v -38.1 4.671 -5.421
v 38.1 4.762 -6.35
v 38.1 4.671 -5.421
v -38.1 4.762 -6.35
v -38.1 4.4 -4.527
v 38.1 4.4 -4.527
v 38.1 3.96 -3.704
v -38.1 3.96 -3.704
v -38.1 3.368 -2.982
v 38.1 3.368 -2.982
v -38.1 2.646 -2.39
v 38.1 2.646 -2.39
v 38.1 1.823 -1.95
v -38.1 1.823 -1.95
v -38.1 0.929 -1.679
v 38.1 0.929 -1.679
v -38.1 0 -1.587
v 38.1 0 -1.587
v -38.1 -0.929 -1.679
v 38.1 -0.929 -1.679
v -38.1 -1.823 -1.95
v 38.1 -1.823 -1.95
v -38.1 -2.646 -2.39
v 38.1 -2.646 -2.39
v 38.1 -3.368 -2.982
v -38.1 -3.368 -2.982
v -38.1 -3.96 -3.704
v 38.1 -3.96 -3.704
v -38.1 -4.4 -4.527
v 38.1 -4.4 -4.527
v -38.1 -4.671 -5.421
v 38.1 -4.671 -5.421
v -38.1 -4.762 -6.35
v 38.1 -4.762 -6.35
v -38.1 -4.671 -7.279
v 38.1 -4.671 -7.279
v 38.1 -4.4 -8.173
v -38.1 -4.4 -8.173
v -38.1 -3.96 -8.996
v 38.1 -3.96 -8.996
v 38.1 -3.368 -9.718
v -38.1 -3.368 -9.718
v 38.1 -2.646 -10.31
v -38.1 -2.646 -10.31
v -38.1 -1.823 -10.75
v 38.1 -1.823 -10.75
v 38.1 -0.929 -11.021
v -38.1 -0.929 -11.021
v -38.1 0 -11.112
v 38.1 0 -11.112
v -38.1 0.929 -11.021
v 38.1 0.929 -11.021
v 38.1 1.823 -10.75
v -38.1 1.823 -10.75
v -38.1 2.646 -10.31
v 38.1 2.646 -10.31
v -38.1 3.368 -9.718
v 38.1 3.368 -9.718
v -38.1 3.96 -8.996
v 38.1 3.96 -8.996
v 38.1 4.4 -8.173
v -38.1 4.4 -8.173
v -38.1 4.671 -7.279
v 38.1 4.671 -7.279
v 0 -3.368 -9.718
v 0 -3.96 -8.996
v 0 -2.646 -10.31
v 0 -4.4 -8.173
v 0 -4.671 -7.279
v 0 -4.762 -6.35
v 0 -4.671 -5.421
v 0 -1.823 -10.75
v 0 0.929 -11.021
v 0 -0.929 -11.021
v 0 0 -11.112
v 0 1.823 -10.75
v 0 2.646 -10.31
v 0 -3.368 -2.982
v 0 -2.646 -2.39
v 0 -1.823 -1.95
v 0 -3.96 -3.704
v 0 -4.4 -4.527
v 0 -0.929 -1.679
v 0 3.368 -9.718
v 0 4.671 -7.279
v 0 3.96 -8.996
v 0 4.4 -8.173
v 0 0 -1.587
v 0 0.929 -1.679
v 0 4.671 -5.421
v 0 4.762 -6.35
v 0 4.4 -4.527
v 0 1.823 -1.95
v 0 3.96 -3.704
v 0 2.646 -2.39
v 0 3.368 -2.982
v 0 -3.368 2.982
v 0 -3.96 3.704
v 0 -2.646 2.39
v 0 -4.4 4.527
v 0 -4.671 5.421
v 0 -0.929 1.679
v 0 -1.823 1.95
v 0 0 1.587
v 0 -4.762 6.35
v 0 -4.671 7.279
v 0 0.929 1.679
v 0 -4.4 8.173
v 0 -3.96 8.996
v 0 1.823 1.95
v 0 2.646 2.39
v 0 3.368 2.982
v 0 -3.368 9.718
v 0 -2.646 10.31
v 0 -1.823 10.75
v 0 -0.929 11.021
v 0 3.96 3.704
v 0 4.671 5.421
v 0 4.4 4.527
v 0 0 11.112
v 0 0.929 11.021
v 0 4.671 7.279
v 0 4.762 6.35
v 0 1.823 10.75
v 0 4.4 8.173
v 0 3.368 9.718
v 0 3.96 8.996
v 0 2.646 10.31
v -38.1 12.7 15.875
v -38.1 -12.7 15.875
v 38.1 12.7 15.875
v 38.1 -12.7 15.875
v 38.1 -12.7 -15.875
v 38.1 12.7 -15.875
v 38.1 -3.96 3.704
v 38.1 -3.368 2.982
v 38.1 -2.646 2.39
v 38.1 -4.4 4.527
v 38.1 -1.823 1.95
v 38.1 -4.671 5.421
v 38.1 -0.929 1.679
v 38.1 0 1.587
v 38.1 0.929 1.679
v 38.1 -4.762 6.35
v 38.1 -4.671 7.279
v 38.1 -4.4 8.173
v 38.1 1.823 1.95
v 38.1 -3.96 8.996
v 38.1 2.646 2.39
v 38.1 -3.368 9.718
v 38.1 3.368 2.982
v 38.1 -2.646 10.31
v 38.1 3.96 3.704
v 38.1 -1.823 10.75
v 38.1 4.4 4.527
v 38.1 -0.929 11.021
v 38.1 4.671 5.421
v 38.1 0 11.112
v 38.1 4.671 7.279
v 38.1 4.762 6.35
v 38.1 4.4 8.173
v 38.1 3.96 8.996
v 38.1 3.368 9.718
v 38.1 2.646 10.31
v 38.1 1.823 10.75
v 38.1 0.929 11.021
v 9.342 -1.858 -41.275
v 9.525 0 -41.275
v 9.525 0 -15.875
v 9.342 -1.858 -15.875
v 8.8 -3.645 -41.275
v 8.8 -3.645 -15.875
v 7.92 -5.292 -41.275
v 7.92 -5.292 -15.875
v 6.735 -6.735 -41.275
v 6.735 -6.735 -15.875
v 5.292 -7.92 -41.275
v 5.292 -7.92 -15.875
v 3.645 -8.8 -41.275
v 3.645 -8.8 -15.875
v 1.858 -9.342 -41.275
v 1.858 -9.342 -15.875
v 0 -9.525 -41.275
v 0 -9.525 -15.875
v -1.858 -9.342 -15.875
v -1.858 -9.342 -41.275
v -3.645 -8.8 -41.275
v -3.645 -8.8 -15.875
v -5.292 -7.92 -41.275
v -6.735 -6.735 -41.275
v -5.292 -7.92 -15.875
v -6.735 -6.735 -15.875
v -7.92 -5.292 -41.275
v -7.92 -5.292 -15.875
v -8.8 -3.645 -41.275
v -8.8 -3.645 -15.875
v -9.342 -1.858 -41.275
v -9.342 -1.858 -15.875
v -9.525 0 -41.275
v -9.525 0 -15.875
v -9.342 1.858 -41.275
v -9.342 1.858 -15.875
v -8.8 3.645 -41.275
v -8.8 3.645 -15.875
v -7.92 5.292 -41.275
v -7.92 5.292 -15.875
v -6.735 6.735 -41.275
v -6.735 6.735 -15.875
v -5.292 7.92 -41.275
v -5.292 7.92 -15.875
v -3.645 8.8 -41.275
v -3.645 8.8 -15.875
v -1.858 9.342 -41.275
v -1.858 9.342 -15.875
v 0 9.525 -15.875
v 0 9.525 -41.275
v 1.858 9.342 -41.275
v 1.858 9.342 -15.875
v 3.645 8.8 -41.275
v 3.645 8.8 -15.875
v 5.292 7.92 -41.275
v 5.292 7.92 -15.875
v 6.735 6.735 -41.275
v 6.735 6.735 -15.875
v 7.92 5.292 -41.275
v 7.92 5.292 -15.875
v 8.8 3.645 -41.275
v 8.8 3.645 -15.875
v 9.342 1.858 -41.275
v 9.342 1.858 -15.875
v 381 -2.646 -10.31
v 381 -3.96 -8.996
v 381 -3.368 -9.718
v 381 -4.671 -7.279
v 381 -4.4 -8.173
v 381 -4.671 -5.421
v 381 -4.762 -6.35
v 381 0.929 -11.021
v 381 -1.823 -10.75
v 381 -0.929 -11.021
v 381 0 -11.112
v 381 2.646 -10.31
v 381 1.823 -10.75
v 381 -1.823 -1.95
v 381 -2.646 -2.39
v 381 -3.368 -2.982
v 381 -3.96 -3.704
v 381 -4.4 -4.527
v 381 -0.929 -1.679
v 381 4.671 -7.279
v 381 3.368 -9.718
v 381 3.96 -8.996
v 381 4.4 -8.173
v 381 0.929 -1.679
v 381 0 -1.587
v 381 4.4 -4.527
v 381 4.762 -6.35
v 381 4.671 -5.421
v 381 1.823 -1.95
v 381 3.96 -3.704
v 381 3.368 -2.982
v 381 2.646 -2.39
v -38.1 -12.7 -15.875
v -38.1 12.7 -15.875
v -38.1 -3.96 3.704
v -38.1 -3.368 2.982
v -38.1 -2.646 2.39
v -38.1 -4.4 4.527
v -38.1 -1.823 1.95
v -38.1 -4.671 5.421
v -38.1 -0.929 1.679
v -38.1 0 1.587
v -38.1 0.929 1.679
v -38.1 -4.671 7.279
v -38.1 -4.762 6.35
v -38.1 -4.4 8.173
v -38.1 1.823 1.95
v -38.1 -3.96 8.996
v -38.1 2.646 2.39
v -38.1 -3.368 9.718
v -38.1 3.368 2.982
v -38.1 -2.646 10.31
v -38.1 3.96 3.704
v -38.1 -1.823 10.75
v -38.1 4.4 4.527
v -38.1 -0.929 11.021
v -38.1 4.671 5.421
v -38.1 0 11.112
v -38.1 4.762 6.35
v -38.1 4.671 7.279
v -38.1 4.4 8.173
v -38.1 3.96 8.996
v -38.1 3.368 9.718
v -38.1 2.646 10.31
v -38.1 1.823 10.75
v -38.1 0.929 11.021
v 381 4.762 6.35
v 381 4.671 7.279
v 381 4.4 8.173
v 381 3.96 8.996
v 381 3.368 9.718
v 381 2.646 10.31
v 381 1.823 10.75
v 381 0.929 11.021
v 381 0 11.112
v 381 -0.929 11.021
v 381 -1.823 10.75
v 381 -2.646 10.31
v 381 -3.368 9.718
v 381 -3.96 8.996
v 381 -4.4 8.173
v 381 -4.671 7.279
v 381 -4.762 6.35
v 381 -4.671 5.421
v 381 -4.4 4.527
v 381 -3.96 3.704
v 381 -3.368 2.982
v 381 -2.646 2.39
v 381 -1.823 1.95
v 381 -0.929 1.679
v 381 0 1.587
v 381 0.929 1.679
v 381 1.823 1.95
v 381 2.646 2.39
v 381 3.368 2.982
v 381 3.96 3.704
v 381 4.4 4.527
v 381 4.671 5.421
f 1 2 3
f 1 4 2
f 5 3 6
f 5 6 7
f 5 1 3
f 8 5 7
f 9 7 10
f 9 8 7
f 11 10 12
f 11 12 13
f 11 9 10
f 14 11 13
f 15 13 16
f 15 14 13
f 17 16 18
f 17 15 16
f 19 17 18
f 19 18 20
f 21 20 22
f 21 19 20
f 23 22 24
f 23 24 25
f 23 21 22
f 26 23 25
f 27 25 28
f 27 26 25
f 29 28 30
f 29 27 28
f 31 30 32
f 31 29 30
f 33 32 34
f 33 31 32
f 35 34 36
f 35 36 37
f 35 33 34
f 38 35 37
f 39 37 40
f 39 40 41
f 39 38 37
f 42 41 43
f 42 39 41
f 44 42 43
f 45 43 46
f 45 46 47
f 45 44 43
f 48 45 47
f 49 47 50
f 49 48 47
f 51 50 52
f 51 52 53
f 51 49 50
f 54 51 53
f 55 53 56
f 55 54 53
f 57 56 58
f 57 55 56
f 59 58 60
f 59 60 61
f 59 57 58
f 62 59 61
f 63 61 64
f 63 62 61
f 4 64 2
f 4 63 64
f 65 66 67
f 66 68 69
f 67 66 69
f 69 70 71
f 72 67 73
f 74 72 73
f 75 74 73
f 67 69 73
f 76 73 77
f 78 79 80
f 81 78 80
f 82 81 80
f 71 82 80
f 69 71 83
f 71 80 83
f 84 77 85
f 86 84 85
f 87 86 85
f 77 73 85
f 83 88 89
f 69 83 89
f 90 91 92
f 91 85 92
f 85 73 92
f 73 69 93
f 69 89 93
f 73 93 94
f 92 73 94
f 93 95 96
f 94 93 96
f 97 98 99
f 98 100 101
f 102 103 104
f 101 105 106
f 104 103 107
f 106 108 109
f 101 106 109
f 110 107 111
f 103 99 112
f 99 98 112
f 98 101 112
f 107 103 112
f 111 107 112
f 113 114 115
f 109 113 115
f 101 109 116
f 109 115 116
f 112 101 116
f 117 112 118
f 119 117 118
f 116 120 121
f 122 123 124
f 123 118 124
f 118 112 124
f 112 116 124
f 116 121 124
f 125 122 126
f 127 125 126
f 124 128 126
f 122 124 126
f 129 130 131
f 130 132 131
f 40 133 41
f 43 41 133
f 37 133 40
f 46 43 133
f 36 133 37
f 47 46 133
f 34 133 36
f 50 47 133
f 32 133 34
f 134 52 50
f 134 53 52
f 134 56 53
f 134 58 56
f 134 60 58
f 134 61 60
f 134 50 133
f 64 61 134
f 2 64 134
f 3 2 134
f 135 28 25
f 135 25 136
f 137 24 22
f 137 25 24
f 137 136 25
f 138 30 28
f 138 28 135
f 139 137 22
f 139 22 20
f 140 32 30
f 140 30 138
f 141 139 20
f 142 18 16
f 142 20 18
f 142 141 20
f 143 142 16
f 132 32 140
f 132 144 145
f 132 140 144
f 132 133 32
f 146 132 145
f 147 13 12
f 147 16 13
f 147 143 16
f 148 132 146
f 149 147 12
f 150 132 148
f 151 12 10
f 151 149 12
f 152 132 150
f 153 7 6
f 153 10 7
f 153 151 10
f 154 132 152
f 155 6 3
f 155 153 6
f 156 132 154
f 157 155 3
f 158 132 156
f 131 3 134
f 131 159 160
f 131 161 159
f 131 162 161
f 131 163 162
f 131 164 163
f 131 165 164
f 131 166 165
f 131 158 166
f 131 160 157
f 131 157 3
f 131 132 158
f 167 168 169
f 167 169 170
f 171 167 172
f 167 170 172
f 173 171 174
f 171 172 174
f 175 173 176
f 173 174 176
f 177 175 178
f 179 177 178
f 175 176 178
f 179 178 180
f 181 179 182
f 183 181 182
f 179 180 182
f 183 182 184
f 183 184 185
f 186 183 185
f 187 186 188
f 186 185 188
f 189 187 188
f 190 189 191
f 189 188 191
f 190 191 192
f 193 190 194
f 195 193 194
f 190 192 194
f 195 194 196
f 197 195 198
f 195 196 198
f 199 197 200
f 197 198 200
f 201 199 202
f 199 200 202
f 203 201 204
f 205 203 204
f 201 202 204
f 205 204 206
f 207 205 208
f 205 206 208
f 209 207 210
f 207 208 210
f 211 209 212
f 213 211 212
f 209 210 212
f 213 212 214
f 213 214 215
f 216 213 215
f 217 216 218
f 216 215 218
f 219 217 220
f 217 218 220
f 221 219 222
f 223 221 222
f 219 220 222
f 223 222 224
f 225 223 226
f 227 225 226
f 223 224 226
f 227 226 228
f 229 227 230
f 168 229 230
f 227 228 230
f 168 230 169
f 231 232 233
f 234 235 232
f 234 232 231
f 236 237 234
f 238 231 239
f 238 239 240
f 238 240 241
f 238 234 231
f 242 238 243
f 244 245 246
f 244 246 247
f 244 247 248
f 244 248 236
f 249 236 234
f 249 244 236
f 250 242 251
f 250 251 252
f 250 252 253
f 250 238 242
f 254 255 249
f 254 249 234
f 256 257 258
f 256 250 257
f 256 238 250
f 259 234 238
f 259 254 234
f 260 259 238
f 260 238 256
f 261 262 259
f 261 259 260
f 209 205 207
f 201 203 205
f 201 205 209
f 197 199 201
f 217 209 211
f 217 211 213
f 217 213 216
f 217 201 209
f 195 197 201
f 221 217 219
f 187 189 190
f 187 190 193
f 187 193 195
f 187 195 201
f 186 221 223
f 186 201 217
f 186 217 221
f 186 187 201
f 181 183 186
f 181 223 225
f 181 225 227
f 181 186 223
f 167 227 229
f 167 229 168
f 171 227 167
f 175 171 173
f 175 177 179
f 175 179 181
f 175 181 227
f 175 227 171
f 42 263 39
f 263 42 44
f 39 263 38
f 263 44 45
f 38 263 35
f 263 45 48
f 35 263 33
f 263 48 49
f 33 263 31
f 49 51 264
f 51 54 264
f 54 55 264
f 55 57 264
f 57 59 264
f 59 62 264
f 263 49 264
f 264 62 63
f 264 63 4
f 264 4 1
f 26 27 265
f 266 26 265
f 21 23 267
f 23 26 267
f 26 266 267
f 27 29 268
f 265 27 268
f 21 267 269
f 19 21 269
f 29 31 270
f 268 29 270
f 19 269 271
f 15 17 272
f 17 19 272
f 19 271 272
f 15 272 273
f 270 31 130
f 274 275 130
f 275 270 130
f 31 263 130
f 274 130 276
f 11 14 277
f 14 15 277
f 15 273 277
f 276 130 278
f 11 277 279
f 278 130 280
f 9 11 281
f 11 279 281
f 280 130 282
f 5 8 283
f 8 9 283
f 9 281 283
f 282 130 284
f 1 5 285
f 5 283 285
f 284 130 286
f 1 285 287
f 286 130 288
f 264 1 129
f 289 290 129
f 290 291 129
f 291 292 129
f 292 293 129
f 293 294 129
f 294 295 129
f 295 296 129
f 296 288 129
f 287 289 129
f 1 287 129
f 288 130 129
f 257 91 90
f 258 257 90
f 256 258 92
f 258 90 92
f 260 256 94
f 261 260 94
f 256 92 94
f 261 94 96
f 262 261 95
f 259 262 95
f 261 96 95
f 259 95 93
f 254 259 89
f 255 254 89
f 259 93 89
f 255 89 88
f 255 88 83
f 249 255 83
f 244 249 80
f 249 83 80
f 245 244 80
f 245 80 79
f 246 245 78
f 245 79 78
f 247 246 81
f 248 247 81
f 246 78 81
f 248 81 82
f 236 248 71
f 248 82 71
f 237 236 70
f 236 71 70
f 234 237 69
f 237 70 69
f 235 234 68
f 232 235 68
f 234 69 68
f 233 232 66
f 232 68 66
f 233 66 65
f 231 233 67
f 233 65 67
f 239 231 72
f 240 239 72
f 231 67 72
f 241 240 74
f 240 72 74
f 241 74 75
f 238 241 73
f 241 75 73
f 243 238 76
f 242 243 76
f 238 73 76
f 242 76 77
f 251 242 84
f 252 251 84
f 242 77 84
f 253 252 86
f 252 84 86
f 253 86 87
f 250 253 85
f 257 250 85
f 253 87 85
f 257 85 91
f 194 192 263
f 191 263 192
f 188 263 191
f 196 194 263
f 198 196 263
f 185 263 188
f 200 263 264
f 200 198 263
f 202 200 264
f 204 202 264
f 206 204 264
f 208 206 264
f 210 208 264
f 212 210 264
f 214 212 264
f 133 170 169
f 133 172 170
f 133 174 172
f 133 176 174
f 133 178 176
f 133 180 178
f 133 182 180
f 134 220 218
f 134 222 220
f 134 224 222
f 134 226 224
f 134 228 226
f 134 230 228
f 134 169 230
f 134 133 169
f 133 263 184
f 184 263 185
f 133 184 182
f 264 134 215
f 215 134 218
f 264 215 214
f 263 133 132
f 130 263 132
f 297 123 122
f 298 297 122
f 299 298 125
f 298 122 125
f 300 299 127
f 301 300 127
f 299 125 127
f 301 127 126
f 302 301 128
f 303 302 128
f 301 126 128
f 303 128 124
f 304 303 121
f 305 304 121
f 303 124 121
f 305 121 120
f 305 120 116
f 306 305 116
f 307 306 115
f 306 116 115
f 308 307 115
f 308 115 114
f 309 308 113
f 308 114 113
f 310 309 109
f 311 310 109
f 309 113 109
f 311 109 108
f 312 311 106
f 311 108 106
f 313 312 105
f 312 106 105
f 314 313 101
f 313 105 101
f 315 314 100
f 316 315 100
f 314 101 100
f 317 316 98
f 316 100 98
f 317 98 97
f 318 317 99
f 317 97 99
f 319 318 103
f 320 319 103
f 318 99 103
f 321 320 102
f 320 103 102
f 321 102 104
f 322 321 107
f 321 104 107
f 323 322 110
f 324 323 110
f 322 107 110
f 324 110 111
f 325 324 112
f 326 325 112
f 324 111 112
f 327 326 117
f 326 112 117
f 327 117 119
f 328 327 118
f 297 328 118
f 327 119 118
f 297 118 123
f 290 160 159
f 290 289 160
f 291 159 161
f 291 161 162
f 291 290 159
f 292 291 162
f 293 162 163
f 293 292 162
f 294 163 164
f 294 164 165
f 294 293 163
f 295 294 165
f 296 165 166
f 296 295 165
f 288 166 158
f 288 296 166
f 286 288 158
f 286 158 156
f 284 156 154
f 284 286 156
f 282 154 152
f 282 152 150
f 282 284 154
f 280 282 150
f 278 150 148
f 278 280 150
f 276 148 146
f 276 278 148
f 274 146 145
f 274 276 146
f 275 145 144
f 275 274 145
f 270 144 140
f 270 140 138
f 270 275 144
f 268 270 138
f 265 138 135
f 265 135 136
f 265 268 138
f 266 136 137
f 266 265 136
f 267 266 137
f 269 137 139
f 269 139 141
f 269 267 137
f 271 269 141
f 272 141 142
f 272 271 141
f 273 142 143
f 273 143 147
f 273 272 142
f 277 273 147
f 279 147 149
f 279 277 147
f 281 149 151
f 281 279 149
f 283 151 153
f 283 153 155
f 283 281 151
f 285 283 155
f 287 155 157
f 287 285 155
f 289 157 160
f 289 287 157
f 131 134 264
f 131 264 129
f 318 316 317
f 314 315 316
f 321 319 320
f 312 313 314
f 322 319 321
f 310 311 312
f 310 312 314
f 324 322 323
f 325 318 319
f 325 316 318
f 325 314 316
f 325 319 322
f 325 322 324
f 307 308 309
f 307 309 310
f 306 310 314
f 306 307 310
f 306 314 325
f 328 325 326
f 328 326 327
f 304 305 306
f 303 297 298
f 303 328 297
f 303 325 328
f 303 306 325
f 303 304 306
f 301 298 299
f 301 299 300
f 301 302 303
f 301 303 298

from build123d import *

# Parameters (mm, degrees)
F0_W     = 25.4
F0_H     = 31.75
F0_R     = 4.7625
F1_DEPTH = 38.1
F2_DEPTH = 381
F3_R     = 9.525
F4_DEPTH = 25.4


with BuildPart() as f1:
    # F0 (on Right) → F1 (new body, symmetric)
    with BuildSketch(Plane.YZ):
        Rectangle(F0_W, F0_H)
        with Locations((0, -6.35)):
            Circle(F0_R, mode=Mode.SUBTRACT)
        with Locations((0, 6.35)):
            Circle(F0_R, mode=Mode.SUBTRACT)
    extrude(amount=F1_DEPTH, both=True)

    # F3 (on face) → F4 (join)
    with BuildSketch(Plane(origin=(0, 0, -15.875), x_dir=(1, 0, 0), z_dir=(0, 0, -1))):
        Circle(F3_R)
    extrude(amount=F4_DEPTH)


with BuildPart() as f2:
    # F0 (on Right) → F2 (new body)
    with BuildSketch(Plane.YZ):
        with Locations((0, 6.35)):
            Circle(F0_R)
    extrude(amount=F2_DEPTH)


with BuildPart() as f2b:
    # F0 (on Right) → F2, piece 2 (new body)
    with BuildSketch(Plane.YZ):
        with Locations((0, -6.35)):
            Circle(F0_R)
    extrude(amount=F2_DEPTH)


solid = Compound([f1.part, f2.part, f2b.part])
